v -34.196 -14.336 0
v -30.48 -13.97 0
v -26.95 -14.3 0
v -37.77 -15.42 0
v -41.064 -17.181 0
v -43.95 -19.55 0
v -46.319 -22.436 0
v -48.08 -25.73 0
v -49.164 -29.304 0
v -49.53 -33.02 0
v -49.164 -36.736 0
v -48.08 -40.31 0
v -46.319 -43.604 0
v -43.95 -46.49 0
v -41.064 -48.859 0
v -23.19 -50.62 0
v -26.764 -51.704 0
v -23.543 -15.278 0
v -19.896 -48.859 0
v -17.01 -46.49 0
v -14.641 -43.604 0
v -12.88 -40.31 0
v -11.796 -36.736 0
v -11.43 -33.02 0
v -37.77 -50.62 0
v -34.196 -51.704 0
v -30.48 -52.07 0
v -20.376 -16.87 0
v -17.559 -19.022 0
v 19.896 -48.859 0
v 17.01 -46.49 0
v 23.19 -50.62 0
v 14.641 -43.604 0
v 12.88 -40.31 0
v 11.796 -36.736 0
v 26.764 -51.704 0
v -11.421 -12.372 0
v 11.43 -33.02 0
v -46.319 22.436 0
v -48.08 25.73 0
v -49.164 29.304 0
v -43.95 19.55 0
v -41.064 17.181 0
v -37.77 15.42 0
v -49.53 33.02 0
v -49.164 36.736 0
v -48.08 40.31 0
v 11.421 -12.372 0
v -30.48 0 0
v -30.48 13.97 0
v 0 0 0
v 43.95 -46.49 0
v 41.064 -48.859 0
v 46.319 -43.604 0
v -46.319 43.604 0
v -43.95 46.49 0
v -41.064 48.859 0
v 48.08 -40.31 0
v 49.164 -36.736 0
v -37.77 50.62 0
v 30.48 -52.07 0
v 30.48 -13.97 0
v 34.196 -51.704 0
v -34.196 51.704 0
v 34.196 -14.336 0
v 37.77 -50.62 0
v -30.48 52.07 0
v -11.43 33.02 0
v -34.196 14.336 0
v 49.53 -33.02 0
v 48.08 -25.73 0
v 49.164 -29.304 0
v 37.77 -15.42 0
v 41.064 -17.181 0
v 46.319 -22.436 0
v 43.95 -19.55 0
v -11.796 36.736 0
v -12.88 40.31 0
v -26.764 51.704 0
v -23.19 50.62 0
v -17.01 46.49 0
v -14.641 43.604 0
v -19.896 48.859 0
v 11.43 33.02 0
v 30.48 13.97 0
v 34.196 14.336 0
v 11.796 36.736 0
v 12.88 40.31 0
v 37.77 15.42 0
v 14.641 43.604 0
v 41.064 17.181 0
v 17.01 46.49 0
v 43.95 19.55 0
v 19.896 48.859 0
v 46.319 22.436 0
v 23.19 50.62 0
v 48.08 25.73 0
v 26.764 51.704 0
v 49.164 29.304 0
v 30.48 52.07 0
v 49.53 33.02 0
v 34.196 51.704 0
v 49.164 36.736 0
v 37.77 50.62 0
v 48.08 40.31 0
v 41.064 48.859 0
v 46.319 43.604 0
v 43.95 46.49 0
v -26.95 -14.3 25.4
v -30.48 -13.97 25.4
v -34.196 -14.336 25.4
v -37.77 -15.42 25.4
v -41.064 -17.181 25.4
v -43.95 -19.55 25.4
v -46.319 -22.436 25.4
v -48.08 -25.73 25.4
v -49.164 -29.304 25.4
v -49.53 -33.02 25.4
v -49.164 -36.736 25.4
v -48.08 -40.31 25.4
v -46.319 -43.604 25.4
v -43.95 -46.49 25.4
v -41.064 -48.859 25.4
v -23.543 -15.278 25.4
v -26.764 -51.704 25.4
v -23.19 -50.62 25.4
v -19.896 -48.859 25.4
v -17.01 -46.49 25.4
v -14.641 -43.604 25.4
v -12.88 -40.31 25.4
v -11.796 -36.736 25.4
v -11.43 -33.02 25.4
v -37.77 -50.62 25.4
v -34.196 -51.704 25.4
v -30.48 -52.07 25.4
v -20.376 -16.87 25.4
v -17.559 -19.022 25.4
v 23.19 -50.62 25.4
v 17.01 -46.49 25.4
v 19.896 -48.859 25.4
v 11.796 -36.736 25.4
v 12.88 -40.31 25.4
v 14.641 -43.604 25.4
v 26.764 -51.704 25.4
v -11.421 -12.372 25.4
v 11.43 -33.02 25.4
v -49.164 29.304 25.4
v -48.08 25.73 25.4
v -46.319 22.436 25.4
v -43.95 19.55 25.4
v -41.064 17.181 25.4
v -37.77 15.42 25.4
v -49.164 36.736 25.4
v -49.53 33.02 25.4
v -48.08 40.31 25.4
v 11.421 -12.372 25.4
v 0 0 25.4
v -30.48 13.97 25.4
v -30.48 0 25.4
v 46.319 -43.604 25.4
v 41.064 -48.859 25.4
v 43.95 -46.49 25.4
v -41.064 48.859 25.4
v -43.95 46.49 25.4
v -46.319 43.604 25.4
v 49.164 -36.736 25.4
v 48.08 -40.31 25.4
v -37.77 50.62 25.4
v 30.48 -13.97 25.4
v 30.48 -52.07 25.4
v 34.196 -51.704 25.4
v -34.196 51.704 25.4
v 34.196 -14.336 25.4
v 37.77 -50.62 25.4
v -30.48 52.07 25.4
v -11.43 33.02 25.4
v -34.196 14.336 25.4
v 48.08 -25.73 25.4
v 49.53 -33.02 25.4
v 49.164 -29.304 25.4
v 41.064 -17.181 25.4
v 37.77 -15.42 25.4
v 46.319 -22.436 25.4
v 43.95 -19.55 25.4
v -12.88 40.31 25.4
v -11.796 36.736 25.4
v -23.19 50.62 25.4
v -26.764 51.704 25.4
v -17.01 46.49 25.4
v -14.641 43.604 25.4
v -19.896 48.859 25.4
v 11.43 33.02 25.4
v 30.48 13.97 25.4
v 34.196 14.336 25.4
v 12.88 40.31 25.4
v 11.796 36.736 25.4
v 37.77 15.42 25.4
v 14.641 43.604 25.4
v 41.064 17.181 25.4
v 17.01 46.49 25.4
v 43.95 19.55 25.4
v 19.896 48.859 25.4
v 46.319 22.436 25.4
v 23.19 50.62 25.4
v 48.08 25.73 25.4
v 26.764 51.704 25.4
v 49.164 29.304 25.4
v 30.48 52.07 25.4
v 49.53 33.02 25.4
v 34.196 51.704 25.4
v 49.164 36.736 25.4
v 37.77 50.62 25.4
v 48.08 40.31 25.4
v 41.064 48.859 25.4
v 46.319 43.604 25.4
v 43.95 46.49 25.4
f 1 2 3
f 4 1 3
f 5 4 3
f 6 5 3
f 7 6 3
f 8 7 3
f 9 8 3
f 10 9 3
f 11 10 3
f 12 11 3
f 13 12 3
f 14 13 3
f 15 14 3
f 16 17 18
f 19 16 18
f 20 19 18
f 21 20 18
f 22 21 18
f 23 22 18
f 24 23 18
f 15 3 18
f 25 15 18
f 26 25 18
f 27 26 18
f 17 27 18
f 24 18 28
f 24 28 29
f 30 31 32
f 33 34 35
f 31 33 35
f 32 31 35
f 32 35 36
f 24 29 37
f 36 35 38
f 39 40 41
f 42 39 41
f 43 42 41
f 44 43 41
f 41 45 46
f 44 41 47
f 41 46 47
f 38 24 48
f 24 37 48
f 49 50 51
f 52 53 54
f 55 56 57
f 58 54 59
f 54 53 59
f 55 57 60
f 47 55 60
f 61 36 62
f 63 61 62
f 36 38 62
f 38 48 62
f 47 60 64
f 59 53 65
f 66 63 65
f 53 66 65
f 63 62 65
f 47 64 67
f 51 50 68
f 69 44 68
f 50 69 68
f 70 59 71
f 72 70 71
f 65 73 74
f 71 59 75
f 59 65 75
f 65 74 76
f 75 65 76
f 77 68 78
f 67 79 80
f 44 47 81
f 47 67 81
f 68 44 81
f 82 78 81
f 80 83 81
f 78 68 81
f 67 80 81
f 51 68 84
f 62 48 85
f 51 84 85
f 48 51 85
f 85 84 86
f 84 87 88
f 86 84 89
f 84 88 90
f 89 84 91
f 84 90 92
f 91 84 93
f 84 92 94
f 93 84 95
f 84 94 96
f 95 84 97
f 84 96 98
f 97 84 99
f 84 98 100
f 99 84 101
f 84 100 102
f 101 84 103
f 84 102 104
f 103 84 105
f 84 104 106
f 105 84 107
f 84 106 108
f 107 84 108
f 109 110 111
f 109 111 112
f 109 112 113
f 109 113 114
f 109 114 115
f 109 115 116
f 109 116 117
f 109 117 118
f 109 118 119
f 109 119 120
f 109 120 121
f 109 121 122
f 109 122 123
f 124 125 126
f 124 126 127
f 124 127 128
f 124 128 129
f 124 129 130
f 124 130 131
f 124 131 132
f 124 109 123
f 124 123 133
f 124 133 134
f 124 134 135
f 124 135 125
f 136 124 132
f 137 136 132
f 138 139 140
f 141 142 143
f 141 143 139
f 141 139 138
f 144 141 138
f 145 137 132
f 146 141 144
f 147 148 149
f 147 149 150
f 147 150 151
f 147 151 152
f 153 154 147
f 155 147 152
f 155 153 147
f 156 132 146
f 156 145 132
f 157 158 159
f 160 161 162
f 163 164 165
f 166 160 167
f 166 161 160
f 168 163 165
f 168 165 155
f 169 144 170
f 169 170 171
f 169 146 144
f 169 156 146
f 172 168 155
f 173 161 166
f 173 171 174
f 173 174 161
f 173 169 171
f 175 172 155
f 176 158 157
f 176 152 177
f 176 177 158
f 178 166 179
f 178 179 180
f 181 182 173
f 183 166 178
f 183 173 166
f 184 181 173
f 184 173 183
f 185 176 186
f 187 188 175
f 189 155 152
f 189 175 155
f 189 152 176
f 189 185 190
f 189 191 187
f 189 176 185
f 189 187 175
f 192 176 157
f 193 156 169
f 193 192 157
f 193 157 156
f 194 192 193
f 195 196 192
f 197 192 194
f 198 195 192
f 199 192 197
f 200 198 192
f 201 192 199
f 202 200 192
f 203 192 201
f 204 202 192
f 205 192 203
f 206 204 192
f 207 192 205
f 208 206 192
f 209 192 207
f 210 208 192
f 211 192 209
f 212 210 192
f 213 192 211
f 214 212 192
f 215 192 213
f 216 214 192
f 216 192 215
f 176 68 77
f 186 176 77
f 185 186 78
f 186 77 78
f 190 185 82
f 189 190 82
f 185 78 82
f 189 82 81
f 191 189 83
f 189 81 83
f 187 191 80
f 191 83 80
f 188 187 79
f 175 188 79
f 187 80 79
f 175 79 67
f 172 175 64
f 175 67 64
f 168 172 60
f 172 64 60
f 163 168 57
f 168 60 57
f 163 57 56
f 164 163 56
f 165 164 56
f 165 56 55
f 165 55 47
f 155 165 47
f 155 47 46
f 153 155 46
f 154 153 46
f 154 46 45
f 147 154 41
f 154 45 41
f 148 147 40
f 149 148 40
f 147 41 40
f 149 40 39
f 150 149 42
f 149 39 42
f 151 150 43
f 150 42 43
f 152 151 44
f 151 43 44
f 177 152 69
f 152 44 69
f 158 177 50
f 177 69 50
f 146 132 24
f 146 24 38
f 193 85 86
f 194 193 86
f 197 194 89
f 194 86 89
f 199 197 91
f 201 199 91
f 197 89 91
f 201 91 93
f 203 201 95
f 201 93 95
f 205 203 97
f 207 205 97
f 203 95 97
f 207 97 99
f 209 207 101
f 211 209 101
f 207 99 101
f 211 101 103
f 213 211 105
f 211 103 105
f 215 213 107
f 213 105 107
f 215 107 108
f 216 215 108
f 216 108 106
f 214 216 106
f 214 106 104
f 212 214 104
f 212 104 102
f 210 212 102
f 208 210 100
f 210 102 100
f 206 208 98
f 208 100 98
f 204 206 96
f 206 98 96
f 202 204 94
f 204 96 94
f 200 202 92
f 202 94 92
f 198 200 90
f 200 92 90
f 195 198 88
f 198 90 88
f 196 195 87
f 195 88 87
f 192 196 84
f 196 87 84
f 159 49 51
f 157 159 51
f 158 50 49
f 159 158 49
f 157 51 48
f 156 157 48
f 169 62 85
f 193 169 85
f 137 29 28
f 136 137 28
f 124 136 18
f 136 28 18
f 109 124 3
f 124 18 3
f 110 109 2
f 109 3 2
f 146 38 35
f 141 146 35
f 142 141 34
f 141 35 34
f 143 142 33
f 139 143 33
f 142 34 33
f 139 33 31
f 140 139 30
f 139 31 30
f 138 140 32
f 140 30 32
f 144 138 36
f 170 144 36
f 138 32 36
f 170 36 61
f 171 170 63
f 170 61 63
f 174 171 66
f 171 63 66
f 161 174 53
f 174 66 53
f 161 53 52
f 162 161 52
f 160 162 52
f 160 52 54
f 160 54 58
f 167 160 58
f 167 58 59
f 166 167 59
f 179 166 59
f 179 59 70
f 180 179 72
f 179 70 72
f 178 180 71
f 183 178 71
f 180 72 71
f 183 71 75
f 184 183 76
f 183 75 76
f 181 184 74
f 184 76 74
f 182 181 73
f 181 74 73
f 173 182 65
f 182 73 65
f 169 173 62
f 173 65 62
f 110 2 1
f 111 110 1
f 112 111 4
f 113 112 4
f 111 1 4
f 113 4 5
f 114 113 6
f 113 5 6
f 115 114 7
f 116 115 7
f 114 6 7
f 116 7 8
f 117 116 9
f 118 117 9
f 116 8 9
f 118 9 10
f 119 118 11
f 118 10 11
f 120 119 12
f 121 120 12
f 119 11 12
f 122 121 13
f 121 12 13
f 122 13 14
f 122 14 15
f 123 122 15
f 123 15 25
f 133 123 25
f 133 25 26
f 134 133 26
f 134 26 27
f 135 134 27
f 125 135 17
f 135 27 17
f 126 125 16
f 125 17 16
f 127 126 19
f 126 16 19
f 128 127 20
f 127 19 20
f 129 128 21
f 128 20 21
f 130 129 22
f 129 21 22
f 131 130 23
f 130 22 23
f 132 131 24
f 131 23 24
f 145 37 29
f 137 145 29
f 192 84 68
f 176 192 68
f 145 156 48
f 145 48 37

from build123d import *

# Parameters (mm, degrees)
F1_DEPTH = 25.4


with BuildPart() as f1:
    # F0 (on Top) → F1 (new body)
    with BuildSketch(Plane.XY):
        with BuildLine():
            Line((-30.48, 13.97), (-30.48, 0))
            Line((-30.48, 0), (-11.4207109466, 0))
            Line((-11.4207109466, 0), (-11.4207109466, 12.3724368588))
            Line((-11.4207109466, 12.3724368588), (-17.5587640429, 19.0219943798))
            ThreePointArc((-17.5587640429, 19.0219943798), (-23.5431241565, 15.277896023), (-30.48, 13.97))
        make_face()
        Polygon((-11.4207109466, 12.3724368588), (-11.4207109466, 0), (0, 0), align=None)
        with BuildLine():
            ThreePointArc((-17.5587640429, -19.0219943798), (-23.5431241565, -15.277896023), (-30.48, -13.97))
            Line((-30.48, -13.97), (-30.48, -33.02))
            Line((-30.48, -33.02), (-17.5587640429, -19.0219943798))
        make_face()
        with BuildLine():
            Line((-30.48, -33.02), (-30.48, -13.97))
            ThreePointArc((-30.48, -13.97), (-43.9503841816, -46.4903841816), (-11.43, -33.02))
            Line((-11.43, -33.02), (-30.48, -33.02))
        make_face()
        with BuildLine():
            ThreePointArc((-49.53, 33.02), (-43.9503841816, 19.5496158184), (-30.48, 13.97))
            Line((-30.48, 13.97), (-30.48, 33.02))
            Line((-30.48, 33.02), (-49.53, 33.02))
        make_face()
        with BuildLine():
            Line((-30.48, 33.02), (-30.48, 13.97))
            ThreePointArc((-30.48, 13.97), (-23.5431241565, 15.277896023), (-17.5587640429, 19.0219943798))
            Line((-17.5587640429, 19.0219943798), (-30.48, 33.02))
        make_face()
        Polygon((11.4207109466, 12.3724368588), (0, 0), (11.4207109466, 0), align=None)
        Polygon((-11.4207109466, 12.3724368588), (0, 0), (11.4207109466, 12.3724368588), align=None)
        Polygon((11.4207109466, 0), (0, 0), (11.4207109466, -12.3724368588), align=None)
        with BuildLine():
            Line((-17.5587640429, 19.0219943798), (-11.4207109466, 12.3724368588))
            Line((-11.4207109466, 12.3724368588), (11.4207109466, 12.3724368588))
            Line((11.4207109466, 12.3724368588), (17.5587640429, 19.0219943798))
            ThreePointArc((17.5587640429, 19.0219943798), (13.0293260161, 25.3795499145), (11.43, 33.02))
            Line((11.43, 33.02), (-11.43, 33.02))
            ThreePointArc((-11.43, 33.02), (-13.0293260161, 25.3795499145), (-17.5587640429, 19.0219943798))
        make_face()
        with BuildLine():
            Line((11.4207109466, -12.3724368588), (-11.4207109466, -12.3724368588))
            Line((-11.4207109466, -12.3724368588), (-17.5587640429, -19.0219943798))
            ThreePointArc((-17.5587640429, -19.0219943798), (-13.0293260161, -25.3795499145), (-11.43, -33.02))
            Line((-11.43, -33.02), (11.43, -33.02))
            ThreePointArc((11.43, -33.02), (13.0293260161, -25.3795499145), (17.5587640429, -19.0219943798))
            Line((17.5587640429, -19.0219943798), (11.4207109466, -12.3724368588))
        make_face()
        with BuildLine():
            Line((-17.5587640429, -19.0219943798), (-30.48, -33.02))
            Line((-30.48, -33.02), (-11.43, -33.02))
            ThreePointArc((-11.43, -33.02), (-13.0293260161, -25.3795499145), (-17.5587640429, -19.0219943798))
        make_face()
        with BuildLine():
            Line((-49.53, 33.02), (-30.48, 33.02))
            Line((-30.48, 33.02), (-11.43, 33.02))
            ThreePointArc((-11.43, 33.02), (-30.48, 52.07), (-49.53, 33.02))
        make_face()
        with BuildLine():
            Line((-11.43, 33.02), (-30.48, 33.02))
            Line((-30.48, 33.02), (-17.5587640429, 19.0219943798))
            ThreePointArc((-17.5587640429, 19.0219943798), (-13.0293260161, 25.3795499145), (-11.43, 33.02))
        make_face()
        with BuildLine():
            Line((11.4207109466, 12.3724368588), (11.4207109466, 0))
            Line((11.4207109466, 0), (30.48, 0))
            Line((30.48, 0), (30.48, 13.97))
            ThreePointArc((30.48, 13.97), (23.5431241565, 15.277896023), (17.5587640429, 19.0219943798))
            Line((17.5587640429, 19.0219943798), (11.4207109466, 12.3724368588))
        make_face()
        with BuildLine():
            Line((30.48, 0), (11.4207109466, 0))
            Line((11.4207109466, 0), (11.4207109466, -12.3724368588))
            Line((11.4207109466, -12.3724368588), (17.5587640429, -19.0219943798))
            ThreePointArc((17.5587640429, -19.0219943798), (23.5431241565, -15.277896023), (30.48, -13.97))
            Line((30.48, -13.97), (30.48, 0))
        make_face()
        with BuildLine():
            ThreePointArc((17.5587640429, -19.0219943798), (13.0293260161, -25.3795499145), (11.43, -33.02))
            Line((11.43, -33.02), (30.48, -33.02))
            Line((30.48, -33.02), (17.5587640429, -19.0219943798))
        make_face()
        with BuildLine():
            Line((30.48, -33.02), (11.43, -33.02))
            ThreePointArc((11.43, -33.02), (30.48, -52.07), (49.53, -33.02))
            ThreePointArc((49.53, -33.02), (43.9503841816, -19.5496158184), (30.48, -13.97))
            Line((30.48, -13.97), (30.48, -33.02))
        make_face()
        with BuildLine():
            ThreePointArc((11.43, 33.02), (13.0293260161, 25.3795499145), (17.5587640429, 19.0219943798))
            Line((17.5587640429, 19.0219943798), (30.48, 33.02))
            Line((30.48, 33.02), (11.43, 33.02))
        make_face()
        with BuildLine():
            Line((30.48, 33.02), (17.5587640429, 19.0219943798))
            ThreePointArc((17.5587640429, 19.0219943798), (23.5431241565, 15.277896023), (30.48, 13.97))
            Line((30.48, 13.97), (30.48, 33.02))
        make_face()
        with BuildLine():
            ThreePointArc((30.48, -13.97), (23.5431241565, -15.277896023), (17.5587640429, -19.0219943798))
            Line((17.5587640429, -19.0219943798), (30.48, -33.02))
            Line((30.48, -33.02), (30.48, -13.97))
        make_face()
        with BuildLine():
            ThreePointArc((49.53, 33.02), (30.48, 52.07), (11.43, 33.02))
            Line((11.43, 33.02), (30.48, 33.02))
            Line((30.48, 33.02), (49.53, 33.02))
        make_face()
        with BuildLine():
            Line((30.48, 33.02), (30.48, 13.97))
            ThreePointArc((30.48, 13.97), (43.9503841816, 19.5496158184), (49.53, 33.02))
            Line((49.53, 33.02), (30.48, 33.02))
        make_face()
    extrude(amount=F1_DEPTH)


solid = f1.part
